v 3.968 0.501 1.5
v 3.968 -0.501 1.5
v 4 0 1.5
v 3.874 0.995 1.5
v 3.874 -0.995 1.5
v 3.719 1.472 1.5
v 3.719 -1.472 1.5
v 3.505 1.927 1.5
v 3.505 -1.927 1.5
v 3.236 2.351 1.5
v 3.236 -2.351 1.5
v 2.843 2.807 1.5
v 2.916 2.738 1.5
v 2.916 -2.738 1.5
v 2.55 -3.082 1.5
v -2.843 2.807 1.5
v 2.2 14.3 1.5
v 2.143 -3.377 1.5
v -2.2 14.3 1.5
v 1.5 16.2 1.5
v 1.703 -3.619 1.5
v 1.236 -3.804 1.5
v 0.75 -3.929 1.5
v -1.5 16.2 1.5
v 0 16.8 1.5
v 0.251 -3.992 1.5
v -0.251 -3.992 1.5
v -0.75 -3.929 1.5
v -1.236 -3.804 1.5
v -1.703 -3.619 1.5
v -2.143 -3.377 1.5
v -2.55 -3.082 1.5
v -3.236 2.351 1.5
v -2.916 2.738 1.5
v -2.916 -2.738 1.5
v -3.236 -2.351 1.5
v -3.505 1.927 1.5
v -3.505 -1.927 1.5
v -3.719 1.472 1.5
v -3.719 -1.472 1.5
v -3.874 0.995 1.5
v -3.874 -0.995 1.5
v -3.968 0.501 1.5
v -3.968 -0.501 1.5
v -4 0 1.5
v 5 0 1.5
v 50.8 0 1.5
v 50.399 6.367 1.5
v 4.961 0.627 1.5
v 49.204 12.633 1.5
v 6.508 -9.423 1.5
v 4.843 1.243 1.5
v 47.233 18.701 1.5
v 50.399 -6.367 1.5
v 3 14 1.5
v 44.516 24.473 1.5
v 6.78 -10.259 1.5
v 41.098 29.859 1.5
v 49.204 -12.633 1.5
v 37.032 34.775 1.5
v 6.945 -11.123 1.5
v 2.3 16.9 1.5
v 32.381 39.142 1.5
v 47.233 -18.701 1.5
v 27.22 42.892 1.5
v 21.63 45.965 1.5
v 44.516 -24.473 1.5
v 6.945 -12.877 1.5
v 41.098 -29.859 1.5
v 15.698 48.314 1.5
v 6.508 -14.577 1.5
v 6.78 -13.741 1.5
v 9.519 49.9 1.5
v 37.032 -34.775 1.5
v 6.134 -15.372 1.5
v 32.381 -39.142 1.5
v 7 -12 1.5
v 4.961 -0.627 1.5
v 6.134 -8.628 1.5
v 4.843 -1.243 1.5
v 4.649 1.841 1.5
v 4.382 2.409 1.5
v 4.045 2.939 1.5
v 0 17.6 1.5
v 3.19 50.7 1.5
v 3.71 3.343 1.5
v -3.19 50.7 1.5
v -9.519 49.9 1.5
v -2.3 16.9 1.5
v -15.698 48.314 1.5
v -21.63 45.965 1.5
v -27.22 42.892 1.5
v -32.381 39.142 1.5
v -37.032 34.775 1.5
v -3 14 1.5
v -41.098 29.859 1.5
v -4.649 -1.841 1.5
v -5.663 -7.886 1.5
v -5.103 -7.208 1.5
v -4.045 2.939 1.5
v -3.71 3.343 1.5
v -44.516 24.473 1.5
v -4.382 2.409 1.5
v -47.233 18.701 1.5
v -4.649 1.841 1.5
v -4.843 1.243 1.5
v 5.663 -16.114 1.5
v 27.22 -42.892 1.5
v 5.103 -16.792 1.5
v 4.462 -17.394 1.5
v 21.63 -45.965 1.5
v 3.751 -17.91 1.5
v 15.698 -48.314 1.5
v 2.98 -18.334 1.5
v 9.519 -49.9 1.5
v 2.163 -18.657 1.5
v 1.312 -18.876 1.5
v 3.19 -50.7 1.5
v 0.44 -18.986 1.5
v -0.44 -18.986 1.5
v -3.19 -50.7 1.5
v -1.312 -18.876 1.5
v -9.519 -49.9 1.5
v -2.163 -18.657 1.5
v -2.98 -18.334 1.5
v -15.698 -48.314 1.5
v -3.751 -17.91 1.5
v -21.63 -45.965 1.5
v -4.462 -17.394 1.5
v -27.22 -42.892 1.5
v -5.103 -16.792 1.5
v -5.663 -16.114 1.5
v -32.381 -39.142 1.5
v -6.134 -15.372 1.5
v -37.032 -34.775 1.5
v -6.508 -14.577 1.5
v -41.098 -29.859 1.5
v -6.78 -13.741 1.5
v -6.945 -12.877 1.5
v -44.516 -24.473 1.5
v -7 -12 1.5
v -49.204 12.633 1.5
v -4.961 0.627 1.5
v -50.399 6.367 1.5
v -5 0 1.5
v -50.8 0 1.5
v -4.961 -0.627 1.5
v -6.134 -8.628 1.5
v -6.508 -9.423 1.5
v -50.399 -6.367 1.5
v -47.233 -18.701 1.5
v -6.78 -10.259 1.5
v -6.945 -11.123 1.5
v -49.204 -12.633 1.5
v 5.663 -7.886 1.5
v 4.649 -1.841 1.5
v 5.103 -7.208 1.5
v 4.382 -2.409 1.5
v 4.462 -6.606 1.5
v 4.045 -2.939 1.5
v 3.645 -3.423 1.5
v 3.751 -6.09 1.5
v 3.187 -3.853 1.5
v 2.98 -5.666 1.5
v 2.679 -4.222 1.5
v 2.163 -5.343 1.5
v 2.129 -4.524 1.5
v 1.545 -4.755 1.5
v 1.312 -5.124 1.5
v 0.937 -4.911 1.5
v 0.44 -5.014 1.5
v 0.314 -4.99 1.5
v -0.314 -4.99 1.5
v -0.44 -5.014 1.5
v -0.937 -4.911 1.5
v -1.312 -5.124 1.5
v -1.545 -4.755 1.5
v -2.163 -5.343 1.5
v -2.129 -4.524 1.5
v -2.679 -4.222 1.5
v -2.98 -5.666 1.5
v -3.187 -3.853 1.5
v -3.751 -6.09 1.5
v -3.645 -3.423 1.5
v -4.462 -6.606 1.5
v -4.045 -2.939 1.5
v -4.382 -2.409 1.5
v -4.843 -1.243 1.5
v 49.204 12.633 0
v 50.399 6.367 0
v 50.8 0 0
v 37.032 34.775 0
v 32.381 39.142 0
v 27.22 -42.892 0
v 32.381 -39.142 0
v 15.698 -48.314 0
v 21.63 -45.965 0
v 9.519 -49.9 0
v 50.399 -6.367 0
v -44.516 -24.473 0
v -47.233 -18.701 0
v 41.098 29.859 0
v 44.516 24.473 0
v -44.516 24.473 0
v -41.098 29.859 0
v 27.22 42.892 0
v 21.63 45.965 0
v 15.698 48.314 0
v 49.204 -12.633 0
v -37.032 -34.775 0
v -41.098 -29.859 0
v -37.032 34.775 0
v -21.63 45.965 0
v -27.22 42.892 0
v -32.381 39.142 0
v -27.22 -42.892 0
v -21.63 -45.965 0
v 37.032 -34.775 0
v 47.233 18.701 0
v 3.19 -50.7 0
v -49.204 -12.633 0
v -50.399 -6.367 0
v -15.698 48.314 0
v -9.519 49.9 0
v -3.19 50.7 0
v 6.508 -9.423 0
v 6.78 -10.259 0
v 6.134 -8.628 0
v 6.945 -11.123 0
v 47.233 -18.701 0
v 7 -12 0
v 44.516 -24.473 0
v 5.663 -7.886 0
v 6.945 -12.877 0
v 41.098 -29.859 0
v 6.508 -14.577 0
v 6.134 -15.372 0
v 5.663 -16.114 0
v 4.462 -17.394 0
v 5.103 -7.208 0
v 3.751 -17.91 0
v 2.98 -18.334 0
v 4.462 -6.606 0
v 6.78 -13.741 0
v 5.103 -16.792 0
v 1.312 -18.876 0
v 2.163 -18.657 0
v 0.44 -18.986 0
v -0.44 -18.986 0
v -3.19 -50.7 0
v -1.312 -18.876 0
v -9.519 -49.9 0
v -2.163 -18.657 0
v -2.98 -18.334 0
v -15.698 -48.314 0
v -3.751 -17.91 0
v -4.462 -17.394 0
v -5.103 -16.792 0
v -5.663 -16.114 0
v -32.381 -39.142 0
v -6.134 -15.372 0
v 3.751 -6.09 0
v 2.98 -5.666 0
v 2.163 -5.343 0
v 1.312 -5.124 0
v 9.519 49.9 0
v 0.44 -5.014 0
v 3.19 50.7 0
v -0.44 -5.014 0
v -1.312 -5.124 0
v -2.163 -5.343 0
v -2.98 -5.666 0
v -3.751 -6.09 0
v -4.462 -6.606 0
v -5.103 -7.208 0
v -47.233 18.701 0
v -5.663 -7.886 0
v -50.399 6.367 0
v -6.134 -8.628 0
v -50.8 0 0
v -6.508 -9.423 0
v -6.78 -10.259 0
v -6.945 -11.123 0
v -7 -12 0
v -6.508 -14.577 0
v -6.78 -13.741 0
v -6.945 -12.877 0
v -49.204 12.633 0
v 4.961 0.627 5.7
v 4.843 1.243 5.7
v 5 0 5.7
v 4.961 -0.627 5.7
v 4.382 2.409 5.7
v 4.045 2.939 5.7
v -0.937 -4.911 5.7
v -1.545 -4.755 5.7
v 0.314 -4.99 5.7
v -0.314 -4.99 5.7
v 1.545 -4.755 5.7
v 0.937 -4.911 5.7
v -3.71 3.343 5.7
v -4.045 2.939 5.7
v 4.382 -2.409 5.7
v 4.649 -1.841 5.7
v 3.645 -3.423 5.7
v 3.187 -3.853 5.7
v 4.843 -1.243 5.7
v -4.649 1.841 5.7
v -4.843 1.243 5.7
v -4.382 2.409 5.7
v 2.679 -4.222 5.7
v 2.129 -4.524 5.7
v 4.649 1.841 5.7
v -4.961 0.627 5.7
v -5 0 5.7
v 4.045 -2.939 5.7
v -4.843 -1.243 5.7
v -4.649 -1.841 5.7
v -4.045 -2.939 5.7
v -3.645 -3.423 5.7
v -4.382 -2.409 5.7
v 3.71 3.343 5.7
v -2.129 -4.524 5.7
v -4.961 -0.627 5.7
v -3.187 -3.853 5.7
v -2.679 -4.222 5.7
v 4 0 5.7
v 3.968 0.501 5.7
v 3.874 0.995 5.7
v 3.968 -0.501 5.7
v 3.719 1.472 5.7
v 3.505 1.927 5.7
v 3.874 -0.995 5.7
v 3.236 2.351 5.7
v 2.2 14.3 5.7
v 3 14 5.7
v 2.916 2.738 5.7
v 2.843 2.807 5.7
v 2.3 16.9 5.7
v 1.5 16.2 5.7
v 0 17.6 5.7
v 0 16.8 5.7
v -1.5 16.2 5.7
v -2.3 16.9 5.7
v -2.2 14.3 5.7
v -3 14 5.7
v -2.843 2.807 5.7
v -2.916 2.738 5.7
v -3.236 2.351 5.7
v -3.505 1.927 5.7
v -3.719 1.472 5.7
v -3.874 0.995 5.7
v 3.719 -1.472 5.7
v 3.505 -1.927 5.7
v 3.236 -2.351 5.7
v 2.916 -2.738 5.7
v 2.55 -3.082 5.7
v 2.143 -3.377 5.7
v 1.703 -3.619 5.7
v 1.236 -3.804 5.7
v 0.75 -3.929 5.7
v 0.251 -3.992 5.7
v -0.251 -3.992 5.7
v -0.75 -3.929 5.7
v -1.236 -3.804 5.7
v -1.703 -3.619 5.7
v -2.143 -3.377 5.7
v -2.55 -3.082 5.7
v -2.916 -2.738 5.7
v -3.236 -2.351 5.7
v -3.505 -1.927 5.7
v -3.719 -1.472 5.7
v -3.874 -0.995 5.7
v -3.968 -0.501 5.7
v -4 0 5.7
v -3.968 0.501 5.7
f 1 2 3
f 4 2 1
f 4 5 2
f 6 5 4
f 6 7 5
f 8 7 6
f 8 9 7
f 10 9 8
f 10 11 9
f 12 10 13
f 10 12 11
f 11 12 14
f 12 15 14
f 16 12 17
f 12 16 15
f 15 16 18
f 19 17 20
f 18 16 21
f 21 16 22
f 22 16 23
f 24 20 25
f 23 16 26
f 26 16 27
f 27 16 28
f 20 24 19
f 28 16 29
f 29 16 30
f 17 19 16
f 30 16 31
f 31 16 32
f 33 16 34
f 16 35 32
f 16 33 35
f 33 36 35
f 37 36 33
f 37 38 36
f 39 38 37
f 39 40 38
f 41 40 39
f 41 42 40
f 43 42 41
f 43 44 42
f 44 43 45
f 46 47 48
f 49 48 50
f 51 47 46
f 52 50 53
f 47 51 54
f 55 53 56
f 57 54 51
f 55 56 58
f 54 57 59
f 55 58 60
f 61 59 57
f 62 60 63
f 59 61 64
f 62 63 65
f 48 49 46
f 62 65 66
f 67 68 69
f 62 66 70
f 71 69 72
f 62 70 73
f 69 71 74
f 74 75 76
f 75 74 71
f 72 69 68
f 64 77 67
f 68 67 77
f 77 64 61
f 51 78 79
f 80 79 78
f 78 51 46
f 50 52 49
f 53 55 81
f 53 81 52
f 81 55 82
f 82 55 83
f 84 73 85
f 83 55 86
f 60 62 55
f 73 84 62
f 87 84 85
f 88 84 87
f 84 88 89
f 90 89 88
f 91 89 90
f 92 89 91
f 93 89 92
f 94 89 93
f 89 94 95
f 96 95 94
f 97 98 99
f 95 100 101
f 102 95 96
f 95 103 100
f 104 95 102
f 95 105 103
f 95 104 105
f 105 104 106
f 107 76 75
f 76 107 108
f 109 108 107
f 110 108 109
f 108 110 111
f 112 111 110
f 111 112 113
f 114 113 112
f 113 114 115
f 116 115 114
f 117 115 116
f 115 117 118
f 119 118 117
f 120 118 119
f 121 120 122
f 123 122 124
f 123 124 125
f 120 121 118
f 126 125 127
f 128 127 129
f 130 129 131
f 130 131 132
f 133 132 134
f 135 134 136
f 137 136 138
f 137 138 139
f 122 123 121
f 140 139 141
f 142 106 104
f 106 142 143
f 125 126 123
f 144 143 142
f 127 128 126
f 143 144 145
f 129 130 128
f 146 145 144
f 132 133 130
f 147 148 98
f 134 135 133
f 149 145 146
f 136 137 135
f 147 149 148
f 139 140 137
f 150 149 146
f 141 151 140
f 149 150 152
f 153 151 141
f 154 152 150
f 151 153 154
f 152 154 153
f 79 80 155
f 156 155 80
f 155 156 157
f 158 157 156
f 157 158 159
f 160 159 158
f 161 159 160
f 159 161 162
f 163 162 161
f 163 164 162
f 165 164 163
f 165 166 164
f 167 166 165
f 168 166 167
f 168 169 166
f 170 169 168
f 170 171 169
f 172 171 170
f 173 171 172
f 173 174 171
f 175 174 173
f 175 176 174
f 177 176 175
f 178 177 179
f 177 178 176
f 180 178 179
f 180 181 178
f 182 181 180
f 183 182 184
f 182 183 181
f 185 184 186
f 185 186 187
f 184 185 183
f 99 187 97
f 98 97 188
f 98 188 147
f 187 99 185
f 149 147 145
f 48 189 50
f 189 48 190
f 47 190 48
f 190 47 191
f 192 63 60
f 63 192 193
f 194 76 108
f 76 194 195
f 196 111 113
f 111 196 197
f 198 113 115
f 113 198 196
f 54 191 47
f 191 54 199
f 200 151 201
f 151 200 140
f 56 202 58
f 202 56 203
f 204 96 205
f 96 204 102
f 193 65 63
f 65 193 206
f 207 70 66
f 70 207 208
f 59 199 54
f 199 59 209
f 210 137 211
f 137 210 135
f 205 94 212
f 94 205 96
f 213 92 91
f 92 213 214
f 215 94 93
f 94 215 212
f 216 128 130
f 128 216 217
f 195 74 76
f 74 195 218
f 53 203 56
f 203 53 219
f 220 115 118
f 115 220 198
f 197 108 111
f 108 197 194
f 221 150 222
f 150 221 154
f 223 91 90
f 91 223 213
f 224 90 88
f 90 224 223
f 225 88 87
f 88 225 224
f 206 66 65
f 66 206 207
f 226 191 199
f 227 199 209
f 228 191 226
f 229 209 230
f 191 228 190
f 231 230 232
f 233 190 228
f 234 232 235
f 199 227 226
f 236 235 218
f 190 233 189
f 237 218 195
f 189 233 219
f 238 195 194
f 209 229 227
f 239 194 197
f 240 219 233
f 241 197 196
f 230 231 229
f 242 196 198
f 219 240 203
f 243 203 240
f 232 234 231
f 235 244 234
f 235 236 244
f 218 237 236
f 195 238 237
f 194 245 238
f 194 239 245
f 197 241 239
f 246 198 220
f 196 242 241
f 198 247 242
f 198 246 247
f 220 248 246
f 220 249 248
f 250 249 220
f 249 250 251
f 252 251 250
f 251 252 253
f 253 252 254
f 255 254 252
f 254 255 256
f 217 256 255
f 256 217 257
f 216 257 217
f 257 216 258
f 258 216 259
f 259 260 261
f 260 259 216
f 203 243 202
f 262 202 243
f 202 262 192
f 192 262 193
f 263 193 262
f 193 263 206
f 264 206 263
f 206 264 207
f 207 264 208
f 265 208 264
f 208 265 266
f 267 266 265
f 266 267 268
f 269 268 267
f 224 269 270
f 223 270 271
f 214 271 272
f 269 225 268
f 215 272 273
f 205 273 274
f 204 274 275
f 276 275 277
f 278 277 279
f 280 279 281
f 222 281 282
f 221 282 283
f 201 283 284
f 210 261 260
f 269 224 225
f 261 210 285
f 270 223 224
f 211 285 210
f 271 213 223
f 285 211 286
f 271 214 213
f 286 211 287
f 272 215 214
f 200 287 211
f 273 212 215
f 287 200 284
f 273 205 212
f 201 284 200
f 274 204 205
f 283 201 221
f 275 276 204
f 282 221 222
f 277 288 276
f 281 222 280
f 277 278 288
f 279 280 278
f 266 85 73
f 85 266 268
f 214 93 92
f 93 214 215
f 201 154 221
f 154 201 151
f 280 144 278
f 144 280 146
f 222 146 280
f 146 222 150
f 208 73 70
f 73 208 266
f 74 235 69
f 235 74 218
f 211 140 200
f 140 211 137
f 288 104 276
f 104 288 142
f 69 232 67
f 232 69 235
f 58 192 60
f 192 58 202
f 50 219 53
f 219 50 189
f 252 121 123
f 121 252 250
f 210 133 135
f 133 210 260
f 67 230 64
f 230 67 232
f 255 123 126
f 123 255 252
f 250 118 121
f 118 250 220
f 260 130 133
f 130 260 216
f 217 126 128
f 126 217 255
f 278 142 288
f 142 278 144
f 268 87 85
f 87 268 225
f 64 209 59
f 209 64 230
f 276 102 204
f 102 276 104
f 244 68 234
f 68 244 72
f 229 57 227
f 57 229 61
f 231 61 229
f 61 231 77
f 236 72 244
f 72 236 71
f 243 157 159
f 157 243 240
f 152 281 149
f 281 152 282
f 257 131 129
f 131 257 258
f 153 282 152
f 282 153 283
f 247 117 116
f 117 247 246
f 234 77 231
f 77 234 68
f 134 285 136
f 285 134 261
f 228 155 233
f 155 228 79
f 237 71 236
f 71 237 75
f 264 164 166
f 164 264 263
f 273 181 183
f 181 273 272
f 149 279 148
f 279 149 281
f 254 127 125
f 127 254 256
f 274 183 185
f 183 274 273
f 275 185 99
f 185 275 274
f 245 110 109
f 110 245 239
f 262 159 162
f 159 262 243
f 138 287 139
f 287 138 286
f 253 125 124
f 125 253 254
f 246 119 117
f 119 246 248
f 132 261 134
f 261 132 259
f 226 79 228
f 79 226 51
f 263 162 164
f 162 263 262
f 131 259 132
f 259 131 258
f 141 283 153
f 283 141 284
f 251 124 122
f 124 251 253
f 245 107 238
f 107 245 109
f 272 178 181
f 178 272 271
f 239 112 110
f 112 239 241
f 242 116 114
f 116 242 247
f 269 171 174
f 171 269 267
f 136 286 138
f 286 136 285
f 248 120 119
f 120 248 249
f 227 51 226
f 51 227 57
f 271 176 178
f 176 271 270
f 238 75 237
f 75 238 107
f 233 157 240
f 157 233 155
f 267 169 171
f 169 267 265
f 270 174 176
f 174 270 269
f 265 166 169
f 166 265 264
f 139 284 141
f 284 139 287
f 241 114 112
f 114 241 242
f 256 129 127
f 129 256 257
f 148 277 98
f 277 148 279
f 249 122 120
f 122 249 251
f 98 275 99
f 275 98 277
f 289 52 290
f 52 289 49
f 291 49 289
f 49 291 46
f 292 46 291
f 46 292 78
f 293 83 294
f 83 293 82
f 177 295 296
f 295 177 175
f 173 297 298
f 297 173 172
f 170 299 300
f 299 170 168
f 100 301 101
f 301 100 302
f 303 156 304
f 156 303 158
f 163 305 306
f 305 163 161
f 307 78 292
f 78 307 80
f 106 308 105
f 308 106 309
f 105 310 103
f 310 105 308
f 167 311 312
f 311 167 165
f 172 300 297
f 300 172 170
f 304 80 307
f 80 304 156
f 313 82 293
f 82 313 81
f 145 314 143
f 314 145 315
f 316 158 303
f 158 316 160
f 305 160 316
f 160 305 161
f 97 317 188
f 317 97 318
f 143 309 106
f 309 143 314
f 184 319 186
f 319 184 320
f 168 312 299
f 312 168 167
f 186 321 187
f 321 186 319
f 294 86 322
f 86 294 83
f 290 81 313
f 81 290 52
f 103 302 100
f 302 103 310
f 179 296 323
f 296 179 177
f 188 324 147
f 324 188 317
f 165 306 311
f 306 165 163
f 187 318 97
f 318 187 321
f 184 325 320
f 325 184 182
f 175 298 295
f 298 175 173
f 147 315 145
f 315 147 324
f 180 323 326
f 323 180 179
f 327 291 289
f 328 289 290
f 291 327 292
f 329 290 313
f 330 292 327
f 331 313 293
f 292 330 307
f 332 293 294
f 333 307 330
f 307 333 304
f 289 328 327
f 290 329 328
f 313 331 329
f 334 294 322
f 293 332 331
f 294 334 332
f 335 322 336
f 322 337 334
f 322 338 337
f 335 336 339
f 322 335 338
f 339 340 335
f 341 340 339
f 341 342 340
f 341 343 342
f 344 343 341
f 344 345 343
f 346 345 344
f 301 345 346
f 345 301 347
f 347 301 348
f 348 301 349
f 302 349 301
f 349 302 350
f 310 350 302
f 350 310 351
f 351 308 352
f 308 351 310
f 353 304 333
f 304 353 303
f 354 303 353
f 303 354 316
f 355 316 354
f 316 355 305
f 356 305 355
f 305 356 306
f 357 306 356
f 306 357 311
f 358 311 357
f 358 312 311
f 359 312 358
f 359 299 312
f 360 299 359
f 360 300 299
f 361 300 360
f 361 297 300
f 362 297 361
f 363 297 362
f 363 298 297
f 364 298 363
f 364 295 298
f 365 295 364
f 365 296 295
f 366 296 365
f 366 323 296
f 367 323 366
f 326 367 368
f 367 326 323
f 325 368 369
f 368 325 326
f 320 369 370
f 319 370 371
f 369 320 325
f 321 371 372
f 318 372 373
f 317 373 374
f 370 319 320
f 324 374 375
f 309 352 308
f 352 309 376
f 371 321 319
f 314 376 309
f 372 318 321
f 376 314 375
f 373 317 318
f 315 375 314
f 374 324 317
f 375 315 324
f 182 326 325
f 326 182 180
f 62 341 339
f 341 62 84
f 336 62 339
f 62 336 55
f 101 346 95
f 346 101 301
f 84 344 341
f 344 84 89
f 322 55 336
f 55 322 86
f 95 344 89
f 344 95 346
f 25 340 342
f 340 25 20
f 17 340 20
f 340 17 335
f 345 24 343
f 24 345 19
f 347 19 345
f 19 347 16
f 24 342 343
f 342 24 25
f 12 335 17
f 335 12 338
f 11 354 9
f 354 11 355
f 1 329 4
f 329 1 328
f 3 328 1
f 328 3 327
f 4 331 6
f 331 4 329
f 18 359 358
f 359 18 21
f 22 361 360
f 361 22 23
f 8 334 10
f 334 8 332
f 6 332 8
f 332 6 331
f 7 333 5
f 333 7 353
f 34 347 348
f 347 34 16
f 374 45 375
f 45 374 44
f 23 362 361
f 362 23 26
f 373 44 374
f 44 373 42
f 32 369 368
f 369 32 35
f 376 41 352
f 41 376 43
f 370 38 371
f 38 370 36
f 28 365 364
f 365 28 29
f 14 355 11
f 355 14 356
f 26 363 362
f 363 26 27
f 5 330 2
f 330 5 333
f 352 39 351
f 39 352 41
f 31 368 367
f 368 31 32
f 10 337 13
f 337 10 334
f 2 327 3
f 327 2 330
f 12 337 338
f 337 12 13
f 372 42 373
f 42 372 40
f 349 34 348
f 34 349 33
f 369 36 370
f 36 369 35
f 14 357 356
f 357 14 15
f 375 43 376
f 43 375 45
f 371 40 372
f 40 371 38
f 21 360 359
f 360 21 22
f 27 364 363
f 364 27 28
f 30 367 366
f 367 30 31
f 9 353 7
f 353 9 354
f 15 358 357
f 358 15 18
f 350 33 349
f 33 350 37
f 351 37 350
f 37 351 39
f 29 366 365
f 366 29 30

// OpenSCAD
// file: servo_connector.scad
$fn=50;

difference(){

    union(){
        cylinder(d=10, 4.2);
        linear_extrude(4.2){
            polygon([[-4,-1],[-3,14],[-2.3,16.9],[0,17.6],[2.3,16.9],[3,14],[4,-1]]);
        }
    }

    translate([0,0,-.1]){
        linear_extrude(5){
        polygon([[-3,0],[-2.2,14.3],[-1.5,16.2],[0,16.8],[1.5,16.2],[2.2,14.3],[3,0]]);
        }
    }
    
    cylinder(d=8, 10, center=true);
}
// main file
$fn=50;

pi_x = 85;
pi_y = 56;
pi_z = 13;

x_clearance = 1;
y_clearance = 1;

wall_thickness = 1.5;

x_buffer = 15;
y_buffer = 15;

usb_buffer = 24;

floor_z = 1;

usb_y = 15;

ethernet_y = 20;

middle_x = pi_x+x_buffer + (wall_thickness + x_clearance) * 4;
middle_x_hole = pi_x+x_buffer + (wall_thickness + x_clearance*2) * 2;

middle_y = pi_y+ usb_buffer + y_buffer + (y_clearance + wall_thickness)*4;
middle_y_hole = pi_y+ usb_buffer + y_buffer + (y_clearance * 2 + wall_thickness)*2;

middle_z = 8;

servo_x = 23;
servo_y = 12.5;
servo_z = 1.5;

servo_x_offset = servo_x/2 - 6;

servo_x_clearance = 0.5;
servo_y_clearance = 0.5;

top_x_clearance = 0.3;
top_y_clearance = 0.3;

top_x = middle_x + (wall_thickness + top_x_clearance) * 2;
top_y = middle_y + (wall_thickness + top_y_clearance) * 2;

top_x_large_hole = middle_x + top_x_clearance*2;
top_y_large_hole = middle_y + top_y_clearance*2;

top_x_small_hole = middle_x - wall_thickness;
top_y_small_hole = middle_y - wall_thickness;
lip = 7;
top_z = 26.5 + lip;

difference(){

    cylinder(r=top_y/2 - 3.5, 1.5);
    
    translate([0,-12,-.3])
    cylinder(r=7, 3);
    
}

translate([0,0,1.5]){
include<servo_connector.scad>
}
